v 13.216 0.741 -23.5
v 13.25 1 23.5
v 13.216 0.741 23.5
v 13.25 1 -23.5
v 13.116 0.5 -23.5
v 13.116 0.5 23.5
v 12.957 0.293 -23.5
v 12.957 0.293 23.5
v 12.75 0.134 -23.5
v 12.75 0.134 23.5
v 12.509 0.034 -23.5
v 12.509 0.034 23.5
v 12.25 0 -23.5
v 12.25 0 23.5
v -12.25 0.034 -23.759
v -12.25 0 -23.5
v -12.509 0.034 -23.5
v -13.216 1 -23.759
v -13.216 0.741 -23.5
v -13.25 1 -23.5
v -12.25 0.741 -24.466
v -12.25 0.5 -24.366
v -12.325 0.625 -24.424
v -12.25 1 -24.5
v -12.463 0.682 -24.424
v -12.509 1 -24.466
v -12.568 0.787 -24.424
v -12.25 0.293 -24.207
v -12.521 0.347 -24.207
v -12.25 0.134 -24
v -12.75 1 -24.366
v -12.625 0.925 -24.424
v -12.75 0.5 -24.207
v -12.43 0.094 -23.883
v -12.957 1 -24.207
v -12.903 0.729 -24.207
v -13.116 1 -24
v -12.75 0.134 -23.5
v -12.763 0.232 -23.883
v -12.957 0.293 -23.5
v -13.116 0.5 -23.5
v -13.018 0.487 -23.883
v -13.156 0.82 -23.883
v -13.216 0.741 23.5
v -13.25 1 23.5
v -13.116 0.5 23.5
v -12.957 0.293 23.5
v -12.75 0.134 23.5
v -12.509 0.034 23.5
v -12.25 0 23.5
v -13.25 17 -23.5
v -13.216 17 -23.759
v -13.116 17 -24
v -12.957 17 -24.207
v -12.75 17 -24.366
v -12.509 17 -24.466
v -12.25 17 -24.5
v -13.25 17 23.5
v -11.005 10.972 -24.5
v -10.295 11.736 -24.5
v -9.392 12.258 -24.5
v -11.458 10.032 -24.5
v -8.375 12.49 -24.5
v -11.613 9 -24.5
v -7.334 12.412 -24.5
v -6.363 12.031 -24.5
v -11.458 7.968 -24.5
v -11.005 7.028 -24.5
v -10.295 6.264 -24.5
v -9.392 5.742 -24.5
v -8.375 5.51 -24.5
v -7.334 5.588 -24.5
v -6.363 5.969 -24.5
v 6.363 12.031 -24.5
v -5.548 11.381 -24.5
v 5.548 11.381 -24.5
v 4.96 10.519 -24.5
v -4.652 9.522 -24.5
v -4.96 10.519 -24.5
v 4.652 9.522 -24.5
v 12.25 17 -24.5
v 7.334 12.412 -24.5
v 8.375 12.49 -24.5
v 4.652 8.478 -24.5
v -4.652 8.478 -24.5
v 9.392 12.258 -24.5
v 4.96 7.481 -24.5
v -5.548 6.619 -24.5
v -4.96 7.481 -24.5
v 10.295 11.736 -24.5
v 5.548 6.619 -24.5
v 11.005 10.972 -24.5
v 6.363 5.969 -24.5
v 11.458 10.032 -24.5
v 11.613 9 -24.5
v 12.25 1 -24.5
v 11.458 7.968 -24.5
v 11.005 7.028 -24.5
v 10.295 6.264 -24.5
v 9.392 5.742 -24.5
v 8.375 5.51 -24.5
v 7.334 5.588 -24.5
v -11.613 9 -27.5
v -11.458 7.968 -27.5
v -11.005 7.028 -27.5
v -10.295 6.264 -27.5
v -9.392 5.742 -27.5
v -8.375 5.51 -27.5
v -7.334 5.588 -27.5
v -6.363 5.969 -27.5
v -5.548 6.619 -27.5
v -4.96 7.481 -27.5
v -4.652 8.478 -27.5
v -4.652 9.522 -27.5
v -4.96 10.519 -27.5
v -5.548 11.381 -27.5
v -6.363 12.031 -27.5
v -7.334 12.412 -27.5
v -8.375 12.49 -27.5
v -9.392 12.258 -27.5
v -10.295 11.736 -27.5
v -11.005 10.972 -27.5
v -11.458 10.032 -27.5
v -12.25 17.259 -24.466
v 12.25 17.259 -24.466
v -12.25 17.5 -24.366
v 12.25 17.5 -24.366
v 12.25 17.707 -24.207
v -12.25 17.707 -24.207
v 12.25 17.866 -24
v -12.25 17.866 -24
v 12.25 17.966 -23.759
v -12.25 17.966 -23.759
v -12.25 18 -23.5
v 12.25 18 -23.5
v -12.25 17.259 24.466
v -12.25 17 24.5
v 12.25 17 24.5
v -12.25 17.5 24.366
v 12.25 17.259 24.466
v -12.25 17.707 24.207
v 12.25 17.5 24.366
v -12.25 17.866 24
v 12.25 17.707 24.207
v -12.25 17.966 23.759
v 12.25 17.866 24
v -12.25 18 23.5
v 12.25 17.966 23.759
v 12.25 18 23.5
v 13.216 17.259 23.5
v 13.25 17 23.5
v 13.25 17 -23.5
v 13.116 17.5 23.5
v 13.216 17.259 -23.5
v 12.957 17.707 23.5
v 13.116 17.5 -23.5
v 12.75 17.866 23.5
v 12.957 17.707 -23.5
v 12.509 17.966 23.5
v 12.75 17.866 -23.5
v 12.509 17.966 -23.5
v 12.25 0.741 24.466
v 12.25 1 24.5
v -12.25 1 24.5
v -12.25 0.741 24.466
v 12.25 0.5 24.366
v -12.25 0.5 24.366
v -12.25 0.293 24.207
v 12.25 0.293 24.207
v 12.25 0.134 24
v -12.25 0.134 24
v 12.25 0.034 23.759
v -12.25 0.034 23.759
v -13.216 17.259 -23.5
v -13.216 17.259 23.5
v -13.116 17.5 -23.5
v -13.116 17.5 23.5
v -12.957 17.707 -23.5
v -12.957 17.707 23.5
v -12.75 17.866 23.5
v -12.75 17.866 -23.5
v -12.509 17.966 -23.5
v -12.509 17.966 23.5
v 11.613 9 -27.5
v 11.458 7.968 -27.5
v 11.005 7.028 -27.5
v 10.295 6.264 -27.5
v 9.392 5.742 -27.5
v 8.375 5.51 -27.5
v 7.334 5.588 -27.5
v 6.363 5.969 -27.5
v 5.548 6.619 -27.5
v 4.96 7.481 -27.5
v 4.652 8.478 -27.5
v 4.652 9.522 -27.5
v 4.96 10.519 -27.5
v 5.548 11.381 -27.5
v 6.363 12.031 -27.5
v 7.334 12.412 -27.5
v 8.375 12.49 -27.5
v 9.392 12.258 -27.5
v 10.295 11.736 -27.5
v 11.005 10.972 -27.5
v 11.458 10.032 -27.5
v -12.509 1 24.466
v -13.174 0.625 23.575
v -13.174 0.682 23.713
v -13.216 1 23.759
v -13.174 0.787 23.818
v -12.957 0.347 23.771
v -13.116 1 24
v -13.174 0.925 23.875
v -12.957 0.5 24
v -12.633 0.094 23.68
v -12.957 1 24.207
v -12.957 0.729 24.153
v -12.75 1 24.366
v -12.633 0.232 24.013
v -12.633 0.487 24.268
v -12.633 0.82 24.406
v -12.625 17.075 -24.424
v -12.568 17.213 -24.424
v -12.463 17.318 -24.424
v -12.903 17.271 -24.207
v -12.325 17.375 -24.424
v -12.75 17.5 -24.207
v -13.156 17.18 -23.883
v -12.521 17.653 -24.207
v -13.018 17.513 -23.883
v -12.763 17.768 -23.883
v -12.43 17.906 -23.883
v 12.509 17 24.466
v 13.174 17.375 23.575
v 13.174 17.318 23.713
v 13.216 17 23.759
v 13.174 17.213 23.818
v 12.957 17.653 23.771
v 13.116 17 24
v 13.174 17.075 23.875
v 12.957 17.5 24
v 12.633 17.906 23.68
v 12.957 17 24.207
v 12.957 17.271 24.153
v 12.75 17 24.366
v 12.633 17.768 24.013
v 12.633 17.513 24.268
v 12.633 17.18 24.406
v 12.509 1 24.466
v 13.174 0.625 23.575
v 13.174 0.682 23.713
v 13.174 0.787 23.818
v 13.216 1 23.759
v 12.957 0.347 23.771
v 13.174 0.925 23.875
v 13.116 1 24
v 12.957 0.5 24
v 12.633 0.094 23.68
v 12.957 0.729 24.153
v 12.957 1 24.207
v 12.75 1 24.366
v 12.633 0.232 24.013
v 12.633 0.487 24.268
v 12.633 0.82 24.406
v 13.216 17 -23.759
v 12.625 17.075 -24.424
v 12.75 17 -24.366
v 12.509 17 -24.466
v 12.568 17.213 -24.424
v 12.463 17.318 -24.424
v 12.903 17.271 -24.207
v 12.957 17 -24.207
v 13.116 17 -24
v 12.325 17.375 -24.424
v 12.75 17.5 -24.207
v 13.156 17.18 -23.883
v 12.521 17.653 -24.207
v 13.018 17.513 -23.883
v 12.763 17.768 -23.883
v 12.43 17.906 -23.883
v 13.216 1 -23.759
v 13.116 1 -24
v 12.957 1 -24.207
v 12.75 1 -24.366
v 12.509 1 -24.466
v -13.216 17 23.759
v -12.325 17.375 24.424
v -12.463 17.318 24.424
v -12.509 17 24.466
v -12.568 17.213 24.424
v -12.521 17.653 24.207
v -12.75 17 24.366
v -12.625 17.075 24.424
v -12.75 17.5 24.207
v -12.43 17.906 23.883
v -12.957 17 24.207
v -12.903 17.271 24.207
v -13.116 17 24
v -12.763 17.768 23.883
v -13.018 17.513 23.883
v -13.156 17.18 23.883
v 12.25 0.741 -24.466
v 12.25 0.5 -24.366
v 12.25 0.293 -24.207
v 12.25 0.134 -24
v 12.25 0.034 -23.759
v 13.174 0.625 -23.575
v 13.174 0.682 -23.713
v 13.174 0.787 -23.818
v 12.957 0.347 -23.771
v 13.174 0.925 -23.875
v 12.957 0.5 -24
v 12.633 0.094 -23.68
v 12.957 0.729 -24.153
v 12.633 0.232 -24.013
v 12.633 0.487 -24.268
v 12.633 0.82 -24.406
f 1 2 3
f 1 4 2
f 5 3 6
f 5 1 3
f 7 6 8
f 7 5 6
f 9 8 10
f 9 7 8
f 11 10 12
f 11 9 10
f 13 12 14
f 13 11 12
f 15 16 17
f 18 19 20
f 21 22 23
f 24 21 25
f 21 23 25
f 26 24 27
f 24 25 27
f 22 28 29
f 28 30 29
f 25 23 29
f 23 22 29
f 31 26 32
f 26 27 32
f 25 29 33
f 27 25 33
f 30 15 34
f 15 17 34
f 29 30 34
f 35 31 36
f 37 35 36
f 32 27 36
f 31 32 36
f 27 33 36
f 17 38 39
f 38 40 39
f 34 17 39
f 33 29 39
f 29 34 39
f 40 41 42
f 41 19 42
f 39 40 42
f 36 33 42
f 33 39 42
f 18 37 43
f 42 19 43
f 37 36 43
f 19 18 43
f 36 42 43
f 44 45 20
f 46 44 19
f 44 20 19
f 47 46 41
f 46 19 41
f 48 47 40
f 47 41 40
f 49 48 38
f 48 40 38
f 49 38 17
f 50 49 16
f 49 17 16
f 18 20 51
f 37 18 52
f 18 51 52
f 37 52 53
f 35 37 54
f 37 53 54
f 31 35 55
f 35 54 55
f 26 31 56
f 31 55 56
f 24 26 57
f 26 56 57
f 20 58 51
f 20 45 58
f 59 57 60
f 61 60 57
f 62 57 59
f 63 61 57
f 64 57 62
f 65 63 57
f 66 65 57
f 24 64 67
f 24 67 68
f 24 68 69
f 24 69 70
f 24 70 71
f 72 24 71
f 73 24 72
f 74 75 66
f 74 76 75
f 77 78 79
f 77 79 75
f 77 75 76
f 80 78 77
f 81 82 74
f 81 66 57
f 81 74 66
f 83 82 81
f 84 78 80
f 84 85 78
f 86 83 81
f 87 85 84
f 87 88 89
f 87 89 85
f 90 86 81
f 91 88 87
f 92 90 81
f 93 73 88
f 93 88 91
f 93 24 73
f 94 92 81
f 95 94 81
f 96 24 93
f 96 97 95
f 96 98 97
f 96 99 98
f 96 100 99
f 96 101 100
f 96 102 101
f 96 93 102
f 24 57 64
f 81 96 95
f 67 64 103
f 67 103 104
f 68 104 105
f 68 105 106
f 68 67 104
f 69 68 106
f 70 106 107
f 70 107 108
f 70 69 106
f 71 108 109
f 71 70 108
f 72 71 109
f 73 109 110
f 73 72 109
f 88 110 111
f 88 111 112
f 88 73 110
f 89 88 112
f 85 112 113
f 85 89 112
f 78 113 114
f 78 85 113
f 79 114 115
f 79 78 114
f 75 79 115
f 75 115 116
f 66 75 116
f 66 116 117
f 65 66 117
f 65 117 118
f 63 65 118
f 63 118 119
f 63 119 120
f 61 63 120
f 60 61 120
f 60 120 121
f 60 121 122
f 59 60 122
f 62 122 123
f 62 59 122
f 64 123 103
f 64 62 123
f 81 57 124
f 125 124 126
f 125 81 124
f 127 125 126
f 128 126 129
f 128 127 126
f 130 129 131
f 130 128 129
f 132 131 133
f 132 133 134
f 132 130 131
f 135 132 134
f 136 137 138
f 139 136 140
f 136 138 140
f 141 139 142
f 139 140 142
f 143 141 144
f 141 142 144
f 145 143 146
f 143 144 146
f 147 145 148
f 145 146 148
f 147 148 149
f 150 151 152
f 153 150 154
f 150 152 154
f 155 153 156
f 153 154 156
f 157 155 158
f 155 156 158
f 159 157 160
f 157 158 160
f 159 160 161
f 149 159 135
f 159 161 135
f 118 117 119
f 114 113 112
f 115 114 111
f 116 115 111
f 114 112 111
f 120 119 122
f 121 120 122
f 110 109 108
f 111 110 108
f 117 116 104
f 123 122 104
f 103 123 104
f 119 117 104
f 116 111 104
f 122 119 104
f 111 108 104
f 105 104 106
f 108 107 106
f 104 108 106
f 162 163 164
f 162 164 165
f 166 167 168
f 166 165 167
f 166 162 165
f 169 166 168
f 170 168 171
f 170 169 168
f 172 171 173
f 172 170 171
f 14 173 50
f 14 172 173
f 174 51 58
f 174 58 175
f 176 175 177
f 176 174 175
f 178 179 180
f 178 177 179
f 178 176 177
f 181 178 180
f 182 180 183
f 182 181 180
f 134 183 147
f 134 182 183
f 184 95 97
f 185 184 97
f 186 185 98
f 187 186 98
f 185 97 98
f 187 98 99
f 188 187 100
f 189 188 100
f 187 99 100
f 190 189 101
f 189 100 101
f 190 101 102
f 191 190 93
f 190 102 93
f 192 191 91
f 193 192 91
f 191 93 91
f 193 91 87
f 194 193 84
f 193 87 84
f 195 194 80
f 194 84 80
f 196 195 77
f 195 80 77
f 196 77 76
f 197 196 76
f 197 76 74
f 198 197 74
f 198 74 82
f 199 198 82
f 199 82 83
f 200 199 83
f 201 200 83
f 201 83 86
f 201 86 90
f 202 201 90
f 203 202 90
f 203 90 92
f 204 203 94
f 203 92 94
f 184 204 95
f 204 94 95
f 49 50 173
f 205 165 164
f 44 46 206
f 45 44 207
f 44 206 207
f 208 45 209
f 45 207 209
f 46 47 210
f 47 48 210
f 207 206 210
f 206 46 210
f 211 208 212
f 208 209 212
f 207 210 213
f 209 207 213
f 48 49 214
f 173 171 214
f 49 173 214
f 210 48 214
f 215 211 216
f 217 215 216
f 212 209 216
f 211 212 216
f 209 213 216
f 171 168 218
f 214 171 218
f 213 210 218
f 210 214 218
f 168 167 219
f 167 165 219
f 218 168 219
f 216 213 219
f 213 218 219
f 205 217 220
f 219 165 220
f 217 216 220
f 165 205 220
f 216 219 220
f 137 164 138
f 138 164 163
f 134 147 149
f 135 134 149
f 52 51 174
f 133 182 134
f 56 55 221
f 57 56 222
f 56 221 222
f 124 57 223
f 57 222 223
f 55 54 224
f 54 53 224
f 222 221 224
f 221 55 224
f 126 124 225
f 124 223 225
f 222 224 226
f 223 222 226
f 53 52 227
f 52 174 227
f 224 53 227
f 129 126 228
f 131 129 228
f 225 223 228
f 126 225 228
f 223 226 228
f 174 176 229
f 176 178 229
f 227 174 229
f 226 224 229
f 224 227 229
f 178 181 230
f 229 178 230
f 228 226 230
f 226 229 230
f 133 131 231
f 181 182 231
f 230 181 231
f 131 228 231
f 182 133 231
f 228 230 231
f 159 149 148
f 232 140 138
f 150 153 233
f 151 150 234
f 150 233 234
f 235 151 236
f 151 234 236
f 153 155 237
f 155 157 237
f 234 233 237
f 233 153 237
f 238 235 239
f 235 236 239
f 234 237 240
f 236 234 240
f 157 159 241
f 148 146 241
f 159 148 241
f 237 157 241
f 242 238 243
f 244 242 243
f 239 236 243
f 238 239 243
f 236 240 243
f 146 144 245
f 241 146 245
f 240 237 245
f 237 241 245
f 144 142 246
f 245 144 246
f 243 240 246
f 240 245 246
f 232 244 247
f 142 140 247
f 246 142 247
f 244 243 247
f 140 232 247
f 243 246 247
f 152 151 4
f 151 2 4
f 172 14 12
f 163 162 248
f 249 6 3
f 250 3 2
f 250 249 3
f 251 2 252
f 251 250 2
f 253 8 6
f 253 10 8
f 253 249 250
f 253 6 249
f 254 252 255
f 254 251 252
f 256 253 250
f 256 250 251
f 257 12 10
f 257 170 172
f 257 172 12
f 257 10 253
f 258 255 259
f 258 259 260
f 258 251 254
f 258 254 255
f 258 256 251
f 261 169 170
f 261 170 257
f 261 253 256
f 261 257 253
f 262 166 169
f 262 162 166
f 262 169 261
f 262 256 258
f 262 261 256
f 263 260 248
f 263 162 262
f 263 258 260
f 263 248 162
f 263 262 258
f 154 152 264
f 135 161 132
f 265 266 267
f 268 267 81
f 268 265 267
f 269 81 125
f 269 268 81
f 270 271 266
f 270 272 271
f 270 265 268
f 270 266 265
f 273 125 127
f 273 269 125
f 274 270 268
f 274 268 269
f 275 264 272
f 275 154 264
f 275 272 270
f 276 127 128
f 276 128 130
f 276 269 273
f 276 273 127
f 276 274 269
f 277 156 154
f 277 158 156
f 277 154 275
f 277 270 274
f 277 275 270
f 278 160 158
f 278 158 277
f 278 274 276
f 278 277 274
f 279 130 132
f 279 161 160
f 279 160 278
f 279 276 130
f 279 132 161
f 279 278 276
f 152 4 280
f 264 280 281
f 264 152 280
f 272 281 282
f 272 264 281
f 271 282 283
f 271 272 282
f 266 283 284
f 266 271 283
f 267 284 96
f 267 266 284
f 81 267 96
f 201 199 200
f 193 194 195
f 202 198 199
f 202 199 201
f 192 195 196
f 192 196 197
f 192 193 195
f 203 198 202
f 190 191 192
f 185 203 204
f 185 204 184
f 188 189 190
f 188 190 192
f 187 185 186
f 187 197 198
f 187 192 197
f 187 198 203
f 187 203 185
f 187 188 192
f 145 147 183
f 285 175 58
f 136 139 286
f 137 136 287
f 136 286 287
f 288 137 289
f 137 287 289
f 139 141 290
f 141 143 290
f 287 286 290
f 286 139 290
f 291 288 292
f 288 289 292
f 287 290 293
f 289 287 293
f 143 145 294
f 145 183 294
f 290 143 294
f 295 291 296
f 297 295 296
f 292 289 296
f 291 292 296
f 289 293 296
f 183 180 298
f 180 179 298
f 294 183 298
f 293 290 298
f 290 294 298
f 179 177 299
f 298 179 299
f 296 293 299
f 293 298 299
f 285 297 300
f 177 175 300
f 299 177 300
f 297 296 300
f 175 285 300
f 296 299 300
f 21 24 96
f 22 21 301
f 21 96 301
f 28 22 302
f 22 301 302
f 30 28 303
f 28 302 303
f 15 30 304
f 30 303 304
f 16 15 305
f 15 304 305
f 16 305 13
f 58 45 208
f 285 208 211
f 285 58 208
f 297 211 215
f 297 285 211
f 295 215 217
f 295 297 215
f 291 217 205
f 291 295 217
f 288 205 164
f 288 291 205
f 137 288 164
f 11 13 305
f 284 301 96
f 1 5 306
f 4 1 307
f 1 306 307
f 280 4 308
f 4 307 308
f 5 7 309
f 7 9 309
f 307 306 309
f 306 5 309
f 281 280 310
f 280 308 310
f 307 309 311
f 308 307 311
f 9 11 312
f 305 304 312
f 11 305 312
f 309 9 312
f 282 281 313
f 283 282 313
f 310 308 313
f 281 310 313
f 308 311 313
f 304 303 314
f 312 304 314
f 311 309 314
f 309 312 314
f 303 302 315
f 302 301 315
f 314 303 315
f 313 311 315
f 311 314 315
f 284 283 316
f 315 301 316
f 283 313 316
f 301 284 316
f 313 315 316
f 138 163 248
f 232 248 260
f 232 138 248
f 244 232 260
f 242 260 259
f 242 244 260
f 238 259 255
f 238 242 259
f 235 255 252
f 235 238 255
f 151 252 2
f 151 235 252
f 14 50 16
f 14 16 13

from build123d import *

# Parameters (mm, degrees)
ESQUISSE1_W        = 26.5
ESQUISSE1_H        = 49
BOSS_EXTRU_1_DEPTH = 18
CONG_1_R           = 1
ESQUISSE2_R        = 3.5
BOSS_EXTRU_2_DEPTH = 3


with BuildPart() as part:
    # Esquisse1 → Boss.-Extru.1 (new body)
    with BuildSketch(Plane(origin=(0, 0, 0), x_dir=(1, 0, 0), z_dir=(0, 1, 0))):
        Rectangle(ESQUISSE1_W, ESQUISSE1_H)
    extrude(amount=BOSS_EXTRU_1_DEPTH)

    # Congé1
    cong_1_edges = [part.edges().sort_by_distance(p)[0] for p in [
        (-13.25, 18, 0),
        (0, 18, 24.5),
        (13.25, 18, 0),
        (0, 0, 24.5),
        (-13.25, 0, 0),
        (0, 0, -24.5),
        (13.25, 0, 0),
        (13.25, 9, 24.5),
        (-13.25, 9, 24.5),
        (-13.25, 9, -24.5),
        (13.25, 9, -24.5),
        (0, 18, -24.5),
    ]]
    fillet(cong_1_edges, radius=CONG_1_R)

    # Esquisse2 → Boss.-Extru.2 (add)
    with BuildSketch(Plane(origin=(0, 0, -24.5), x_dir=(-1, 0, 0), z_dir=(0, 0, -1))):
        with Locations(Location((-8.113267723, 9, 0), (0, 0, 180))):
            Circle(ESQUISSE2_R)
    boss_extru_2 = extrude(amount=BOSS_EXTRU_2_DEPTH)

    # Symétrie1: Boss.-Extru.2 across plane
    add(boss_extru_2.mirror(Plane(origin=(0, 0, 0), x_dir=(0, 0, 1), z_dir=(1, 0, 0))))


solid = part.part
